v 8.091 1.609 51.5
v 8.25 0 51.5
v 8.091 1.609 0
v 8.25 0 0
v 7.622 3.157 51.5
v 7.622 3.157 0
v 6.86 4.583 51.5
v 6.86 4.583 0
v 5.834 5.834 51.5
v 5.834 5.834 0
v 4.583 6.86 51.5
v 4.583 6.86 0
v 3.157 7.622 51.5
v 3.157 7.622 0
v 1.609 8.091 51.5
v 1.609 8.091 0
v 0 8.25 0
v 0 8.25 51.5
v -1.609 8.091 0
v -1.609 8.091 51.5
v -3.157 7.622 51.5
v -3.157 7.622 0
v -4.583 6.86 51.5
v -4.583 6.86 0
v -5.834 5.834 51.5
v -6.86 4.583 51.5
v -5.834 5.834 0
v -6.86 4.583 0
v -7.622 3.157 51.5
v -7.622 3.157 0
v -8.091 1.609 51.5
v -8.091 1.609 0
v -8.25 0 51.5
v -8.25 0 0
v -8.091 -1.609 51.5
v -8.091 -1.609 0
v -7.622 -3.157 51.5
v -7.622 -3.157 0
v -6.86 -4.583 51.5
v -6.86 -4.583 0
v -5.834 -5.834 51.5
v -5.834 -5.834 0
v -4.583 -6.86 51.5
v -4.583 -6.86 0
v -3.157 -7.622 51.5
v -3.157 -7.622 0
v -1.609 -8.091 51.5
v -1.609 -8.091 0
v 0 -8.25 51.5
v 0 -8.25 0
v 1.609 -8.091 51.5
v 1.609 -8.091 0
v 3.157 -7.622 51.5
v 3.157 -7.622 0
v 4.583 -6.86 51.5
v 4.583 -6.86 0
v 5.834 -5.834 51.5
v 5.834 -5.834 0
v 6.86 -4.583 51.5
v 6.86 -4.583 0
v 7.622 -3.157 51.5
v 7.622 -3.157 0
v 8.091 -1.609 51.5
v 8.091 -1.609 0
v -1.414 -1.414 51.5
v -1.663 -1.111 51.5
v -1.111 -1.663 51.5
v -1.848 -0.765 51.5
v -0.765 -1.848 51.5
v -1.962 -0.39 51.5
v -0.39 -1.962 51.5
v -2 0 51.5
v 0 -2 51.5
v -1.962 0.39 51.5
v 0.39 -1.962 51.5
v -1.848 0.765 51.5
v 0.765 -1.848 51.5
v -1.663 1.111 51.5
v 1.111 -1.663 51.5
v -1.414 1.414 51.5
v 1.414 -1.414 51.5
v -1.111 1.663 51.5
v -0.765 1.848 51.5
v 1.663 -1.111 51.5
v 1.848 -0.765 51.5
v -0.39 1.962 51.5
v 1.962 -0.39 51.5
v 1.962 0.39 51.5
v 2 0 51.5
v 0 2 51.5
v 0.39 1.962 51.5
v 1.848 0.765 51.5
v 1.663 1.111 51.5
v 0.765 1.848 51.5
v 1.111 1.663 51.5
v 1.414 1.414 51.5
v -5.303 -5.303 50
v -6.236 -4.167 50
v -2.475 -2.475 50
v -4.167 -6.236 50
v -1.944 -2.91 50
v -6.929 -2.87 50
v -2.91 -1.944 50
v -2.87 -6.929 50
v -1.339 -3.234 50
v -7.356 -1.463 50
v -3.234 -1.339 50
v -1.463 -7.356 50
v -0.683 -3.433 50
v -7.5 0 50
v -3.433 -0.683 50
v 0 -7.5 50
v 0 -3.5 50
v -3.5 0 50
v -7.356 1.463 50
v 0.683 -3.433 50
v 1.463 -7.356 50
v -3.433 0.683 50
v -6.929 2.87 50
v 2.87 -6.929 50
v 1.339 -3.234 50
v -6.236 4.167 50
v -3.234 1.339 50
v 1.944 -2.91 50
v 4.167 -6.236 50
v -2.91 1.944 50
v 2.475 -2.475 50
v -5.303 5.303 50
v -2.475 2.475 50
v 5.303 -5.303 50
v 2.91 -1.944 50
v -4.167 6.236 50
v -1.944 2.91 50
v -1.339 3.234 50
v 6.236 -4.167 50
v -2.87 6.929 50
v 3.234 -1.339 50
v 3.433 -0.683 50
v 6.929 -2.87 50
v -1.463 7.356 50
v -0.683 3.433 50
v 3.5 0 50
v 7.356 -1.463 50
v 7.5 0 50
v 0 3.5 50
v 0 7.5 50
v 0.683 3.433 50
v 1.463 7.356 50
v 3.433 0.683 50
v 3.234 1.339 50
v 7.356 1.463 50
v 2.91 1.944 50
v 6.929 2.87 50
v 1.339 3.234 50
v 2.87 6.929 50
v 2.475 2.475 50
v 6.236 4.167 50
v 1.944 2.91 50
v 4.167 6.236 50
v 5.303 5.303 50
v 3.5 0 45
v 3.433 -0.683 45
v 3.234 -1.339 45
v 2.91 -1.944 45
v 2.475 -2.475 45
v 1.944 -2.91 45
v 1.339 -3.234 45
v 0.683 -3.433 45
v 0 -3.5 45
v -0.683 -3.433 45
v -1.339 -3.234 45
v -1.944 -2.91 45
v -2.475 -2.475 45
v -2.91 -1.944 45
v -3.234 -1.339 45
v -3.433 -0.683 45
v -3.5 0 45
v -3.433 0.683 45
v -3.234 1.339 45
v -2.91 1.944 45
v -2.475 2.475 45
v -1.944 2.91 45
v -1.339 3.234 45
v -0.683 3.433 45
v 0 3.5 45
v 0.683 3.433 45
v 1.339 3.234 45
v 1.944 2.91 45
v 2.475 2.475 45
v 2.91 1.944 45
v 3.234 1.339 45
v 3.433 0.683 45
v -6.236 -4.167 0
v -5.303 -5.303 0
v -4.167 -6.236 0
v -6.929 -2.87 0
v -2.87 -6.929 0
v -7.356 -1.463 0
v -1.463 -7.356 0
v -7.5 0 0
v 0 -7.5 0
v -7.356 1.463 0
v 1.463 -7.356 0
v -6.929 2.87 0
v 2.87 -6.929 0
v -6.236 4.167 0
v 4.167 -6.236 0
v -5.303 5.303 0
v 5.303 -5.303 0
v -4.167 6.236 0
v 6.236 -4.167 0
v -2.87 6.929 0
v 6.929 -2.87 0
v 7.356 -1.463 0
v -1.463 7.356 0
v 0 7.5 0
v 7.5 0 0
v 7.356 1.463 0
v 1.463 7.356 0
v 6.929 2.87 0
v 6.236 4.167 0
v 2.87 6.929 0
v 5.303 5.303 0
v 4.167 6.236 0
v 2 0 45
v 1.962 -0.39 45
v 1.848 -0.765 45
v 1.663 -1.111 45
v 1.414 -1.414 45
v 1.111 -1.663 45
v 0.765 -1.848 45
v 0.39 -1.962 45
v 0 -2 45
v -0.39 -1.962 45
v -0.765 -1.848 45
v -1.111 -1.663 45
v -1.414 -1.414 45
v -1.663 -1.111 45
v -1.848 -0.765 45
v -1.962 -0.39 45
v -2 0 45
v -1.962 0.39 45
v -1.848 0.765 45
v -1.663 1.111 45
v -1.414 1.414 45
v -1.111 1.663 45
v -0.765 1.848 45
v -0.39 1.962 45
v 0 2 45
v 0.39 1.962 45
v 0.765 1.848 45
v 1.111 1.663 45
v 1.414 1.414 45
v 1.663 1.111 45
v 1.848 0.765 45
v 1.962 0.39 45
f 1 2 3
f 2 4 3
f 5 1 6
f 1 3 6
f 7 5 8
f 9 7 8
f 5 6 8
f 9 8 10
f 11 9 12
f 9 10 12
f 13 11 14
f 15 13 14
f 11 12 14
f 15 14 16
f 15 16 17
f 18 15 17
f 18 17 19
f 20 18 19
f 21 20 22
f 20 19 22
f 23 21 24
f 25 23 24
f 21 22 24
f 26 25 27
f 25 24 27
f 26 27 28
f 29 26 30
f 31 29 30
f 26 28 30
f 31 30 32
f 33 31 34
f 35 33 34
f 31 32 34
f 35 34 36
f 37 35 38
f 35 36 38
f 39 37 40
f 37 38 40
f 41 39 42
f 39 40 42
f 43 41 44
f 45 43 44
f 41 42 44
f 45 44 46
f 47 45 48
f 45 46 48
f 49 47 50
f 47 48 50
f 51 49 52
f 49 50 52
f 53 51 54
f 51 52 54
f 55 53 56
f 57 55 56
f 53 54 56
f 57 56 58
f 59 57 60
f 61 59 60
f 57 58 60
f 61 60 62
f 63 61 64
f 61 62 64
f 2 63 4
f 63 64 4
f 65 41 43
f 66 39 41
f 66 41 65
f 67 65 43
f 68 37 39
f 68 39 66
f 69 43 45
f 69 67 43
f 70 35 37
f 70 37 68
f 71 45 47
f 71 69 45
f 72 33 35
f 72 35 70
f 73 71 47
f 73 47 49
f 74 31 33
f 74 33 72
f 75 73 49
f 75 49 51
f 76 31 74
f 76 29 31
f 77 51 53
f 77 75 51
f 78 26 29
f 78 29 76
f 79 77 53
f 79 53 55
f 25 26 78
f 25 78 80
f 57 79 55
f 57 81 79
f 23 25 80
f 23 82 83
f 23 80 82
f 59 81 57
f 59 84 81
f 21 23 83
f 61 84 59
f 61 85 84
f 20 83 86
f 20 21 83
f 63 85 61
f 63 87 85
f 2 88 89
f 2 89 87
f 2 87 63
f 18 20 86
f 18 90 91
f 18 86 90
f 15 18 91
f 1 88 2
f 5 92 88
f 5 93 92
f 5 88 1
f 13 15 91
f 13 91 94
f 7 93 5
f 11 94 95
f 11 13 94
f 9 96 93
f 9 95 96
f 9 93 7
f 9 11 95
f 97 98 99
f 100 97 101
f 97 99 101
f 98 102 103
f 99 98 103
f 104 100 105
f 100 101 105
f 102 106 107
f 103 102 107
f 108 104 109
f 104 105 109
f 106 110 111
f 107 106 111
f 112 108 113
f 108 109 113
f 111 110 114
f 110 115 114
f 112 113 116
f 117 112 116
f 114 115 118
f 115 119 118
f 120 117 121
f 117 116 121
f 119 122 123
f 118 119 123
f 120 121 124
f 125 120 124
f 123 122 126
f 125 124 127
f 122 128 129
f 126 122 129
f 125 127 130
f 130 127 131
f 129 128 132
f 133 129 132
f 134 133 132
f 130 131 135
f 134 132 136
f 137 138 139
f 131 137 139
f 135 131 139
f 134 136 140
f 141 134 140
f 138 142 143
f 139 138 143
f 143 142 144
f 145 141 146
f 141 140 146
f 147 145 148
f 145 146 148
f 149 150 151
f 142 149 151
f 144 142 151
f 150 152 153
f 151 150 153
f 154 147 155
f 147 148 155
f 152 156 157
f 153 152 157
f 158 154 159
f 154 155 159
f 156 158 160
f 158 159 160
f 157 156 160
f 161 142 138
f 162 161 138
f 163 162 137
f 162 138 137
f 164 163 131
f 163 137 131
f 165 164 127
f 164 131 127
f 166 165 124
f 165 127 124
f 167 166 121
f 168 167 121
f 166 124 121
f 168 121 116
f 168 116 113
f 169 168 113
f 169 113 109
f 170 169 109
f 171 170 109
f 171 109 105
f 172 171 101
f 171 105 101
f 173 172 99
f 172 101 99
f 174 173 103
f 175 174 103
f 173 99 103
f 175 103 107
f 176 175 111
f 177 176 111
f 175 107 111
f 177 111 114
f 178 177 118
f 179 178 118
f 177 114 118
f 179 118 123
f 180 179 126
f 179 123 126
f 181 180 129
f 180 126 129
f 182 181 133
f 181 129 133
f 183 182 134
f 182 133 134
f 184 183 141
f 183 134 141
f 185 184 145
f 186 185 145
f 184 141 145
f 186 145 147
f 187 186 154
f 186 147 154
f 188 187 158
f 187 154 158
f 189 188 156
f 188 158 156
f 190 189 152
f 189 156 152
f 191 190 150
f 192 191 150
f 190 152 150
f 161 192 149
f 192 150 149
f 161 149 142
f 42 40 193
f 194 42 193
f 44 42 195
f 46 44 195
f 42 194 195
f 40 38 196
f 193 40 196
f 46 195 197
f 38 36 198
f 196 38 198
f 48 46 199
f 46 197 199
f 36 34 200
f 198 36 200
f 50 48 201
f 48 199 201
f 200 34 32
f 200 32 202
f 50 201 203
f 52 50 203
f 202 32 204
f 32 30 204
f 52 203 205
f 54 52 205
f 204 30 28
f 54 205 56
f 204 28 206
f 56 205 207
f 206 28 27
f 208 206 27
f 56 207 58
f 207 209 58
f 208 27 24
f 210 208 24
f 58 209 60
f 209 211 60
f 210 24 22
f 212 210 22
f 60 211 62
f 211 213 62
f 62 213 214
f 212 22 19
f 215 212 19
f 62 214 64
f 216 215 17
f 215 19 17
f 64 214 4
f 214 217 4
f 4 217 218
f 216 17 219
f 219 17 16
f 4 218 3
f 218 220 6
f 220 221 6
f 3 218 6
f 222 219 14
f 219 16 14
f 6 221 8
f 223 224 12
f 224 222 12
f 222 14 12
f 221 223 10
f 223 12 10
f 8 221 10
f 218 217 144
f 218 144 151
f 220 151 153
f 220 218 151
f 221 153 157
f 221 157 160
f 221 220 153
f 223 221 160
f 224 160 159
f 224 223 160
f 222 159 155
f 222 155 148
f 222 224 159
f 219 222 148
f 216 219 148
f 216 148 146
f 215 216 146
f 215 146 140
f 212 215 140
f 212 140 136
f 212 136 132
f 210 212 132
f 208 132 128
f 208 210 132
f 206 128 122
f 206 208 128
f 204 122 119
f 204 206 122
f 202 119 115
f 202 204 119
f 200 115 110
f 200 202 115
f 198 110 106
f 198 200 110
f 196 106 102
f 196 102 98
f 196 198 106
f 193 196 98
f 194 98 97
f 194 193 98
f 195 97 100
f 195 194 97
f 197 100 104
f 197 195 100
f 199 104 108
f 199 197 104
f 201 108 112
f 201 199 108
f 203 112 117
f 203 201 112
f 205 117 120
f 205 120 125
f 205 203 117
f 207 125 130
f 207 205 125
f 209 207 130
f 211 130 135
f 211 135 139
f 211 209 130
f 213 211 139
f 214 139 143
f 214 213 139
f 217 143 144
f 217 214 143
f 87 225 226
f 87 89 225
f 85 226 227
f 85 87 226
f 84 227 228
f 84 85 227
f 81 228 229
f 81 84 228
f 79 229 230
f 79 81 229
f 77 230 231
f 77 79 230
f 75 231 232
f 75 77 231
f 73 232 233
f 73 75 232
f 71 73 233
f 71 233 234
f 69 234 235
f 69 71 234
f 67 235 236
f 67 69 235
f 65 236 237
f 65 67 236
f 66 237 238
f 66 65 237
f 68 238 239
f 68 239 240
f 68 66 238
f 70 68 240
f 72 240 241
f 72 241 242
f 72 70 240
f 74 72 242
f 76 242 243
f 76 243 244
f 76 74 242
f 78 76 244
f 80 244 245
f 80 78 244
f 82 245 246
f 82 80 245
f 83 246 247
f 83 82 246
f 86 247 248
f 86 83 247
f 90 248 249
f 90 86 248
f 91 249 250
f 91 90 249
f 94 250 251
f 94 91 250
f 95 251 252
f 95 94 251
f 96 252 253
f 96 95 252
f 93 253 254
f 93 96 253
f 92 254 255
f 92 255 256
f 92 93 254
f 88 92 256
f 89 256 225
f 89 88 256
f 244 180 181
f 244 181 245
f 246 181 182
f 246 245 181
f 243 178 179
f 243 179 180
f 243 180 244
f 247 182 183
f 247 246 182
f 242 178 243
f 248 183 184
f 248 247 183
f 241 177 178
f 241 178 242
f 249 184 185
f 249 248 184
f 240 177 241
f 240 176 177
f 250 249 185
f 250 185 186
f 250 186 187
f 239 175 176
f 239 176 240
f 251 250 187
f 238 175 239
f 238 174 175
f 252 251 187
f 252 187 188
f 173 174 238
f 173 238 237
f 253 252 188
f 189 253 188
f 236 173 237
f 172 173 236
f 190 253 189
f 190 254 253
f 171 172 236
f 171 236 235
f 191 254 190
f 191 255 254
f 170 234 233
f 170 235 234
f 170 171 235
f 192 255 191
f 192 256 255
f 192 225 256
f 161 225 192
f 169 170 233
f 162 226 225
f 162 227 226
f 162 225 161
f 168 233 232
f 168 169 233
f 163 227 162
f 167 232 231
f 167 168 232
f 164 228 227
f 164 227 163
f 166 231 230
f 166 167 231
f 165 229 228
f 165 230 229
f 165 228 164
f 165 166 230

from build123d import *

# Parameters (mm, degrees)
F0_R     = 8.25
F0_R_2   = 7.5
F1_DEPTH = 50
F2_R     = 8.25
F3_DEPTH = 1.5
F4_R     = 2
F5_DEPTH = 25
F6_R     = 3.5
F6_R_2   = 2
F7_DEPTH = 5


with BuildPart() as f1:
    # F0 (on Top) → F1 (new body)
    with BuildSketch(Plane.XY):
        Circle(F0_R)
        Circle(F0_R_2, mode=Mode.SUBTRACT)
    extrude(amount=F1_DEPTH)

    # F2 (on face) → F3 (join)
    with BuildSketch(Plane.XY.offset(50)):
        Circle(F2_R)
    extrude(amount=F3_DEPTH)

    # F4 (on face) → F5 (cut)
    with BuildSketch(Plane.XY.offset(51.5)):
        Circle(F4_R)
    extrude(amount=-F5_DEPTH, mode=Mode.SUBTRACT)

    # F6 (on face) → F7 (join)
    with BuildSketch(Plane(origin=(0, 0, 50), x_dir=(1, 0, 0), z_dir=(0, 0, -1))):
        Circle(F6_R)
        Circle(F6_R_2, mode=Mode.SUBTRACT)
    extrude(amount=F7_DEPTH)


solid = f1.part
